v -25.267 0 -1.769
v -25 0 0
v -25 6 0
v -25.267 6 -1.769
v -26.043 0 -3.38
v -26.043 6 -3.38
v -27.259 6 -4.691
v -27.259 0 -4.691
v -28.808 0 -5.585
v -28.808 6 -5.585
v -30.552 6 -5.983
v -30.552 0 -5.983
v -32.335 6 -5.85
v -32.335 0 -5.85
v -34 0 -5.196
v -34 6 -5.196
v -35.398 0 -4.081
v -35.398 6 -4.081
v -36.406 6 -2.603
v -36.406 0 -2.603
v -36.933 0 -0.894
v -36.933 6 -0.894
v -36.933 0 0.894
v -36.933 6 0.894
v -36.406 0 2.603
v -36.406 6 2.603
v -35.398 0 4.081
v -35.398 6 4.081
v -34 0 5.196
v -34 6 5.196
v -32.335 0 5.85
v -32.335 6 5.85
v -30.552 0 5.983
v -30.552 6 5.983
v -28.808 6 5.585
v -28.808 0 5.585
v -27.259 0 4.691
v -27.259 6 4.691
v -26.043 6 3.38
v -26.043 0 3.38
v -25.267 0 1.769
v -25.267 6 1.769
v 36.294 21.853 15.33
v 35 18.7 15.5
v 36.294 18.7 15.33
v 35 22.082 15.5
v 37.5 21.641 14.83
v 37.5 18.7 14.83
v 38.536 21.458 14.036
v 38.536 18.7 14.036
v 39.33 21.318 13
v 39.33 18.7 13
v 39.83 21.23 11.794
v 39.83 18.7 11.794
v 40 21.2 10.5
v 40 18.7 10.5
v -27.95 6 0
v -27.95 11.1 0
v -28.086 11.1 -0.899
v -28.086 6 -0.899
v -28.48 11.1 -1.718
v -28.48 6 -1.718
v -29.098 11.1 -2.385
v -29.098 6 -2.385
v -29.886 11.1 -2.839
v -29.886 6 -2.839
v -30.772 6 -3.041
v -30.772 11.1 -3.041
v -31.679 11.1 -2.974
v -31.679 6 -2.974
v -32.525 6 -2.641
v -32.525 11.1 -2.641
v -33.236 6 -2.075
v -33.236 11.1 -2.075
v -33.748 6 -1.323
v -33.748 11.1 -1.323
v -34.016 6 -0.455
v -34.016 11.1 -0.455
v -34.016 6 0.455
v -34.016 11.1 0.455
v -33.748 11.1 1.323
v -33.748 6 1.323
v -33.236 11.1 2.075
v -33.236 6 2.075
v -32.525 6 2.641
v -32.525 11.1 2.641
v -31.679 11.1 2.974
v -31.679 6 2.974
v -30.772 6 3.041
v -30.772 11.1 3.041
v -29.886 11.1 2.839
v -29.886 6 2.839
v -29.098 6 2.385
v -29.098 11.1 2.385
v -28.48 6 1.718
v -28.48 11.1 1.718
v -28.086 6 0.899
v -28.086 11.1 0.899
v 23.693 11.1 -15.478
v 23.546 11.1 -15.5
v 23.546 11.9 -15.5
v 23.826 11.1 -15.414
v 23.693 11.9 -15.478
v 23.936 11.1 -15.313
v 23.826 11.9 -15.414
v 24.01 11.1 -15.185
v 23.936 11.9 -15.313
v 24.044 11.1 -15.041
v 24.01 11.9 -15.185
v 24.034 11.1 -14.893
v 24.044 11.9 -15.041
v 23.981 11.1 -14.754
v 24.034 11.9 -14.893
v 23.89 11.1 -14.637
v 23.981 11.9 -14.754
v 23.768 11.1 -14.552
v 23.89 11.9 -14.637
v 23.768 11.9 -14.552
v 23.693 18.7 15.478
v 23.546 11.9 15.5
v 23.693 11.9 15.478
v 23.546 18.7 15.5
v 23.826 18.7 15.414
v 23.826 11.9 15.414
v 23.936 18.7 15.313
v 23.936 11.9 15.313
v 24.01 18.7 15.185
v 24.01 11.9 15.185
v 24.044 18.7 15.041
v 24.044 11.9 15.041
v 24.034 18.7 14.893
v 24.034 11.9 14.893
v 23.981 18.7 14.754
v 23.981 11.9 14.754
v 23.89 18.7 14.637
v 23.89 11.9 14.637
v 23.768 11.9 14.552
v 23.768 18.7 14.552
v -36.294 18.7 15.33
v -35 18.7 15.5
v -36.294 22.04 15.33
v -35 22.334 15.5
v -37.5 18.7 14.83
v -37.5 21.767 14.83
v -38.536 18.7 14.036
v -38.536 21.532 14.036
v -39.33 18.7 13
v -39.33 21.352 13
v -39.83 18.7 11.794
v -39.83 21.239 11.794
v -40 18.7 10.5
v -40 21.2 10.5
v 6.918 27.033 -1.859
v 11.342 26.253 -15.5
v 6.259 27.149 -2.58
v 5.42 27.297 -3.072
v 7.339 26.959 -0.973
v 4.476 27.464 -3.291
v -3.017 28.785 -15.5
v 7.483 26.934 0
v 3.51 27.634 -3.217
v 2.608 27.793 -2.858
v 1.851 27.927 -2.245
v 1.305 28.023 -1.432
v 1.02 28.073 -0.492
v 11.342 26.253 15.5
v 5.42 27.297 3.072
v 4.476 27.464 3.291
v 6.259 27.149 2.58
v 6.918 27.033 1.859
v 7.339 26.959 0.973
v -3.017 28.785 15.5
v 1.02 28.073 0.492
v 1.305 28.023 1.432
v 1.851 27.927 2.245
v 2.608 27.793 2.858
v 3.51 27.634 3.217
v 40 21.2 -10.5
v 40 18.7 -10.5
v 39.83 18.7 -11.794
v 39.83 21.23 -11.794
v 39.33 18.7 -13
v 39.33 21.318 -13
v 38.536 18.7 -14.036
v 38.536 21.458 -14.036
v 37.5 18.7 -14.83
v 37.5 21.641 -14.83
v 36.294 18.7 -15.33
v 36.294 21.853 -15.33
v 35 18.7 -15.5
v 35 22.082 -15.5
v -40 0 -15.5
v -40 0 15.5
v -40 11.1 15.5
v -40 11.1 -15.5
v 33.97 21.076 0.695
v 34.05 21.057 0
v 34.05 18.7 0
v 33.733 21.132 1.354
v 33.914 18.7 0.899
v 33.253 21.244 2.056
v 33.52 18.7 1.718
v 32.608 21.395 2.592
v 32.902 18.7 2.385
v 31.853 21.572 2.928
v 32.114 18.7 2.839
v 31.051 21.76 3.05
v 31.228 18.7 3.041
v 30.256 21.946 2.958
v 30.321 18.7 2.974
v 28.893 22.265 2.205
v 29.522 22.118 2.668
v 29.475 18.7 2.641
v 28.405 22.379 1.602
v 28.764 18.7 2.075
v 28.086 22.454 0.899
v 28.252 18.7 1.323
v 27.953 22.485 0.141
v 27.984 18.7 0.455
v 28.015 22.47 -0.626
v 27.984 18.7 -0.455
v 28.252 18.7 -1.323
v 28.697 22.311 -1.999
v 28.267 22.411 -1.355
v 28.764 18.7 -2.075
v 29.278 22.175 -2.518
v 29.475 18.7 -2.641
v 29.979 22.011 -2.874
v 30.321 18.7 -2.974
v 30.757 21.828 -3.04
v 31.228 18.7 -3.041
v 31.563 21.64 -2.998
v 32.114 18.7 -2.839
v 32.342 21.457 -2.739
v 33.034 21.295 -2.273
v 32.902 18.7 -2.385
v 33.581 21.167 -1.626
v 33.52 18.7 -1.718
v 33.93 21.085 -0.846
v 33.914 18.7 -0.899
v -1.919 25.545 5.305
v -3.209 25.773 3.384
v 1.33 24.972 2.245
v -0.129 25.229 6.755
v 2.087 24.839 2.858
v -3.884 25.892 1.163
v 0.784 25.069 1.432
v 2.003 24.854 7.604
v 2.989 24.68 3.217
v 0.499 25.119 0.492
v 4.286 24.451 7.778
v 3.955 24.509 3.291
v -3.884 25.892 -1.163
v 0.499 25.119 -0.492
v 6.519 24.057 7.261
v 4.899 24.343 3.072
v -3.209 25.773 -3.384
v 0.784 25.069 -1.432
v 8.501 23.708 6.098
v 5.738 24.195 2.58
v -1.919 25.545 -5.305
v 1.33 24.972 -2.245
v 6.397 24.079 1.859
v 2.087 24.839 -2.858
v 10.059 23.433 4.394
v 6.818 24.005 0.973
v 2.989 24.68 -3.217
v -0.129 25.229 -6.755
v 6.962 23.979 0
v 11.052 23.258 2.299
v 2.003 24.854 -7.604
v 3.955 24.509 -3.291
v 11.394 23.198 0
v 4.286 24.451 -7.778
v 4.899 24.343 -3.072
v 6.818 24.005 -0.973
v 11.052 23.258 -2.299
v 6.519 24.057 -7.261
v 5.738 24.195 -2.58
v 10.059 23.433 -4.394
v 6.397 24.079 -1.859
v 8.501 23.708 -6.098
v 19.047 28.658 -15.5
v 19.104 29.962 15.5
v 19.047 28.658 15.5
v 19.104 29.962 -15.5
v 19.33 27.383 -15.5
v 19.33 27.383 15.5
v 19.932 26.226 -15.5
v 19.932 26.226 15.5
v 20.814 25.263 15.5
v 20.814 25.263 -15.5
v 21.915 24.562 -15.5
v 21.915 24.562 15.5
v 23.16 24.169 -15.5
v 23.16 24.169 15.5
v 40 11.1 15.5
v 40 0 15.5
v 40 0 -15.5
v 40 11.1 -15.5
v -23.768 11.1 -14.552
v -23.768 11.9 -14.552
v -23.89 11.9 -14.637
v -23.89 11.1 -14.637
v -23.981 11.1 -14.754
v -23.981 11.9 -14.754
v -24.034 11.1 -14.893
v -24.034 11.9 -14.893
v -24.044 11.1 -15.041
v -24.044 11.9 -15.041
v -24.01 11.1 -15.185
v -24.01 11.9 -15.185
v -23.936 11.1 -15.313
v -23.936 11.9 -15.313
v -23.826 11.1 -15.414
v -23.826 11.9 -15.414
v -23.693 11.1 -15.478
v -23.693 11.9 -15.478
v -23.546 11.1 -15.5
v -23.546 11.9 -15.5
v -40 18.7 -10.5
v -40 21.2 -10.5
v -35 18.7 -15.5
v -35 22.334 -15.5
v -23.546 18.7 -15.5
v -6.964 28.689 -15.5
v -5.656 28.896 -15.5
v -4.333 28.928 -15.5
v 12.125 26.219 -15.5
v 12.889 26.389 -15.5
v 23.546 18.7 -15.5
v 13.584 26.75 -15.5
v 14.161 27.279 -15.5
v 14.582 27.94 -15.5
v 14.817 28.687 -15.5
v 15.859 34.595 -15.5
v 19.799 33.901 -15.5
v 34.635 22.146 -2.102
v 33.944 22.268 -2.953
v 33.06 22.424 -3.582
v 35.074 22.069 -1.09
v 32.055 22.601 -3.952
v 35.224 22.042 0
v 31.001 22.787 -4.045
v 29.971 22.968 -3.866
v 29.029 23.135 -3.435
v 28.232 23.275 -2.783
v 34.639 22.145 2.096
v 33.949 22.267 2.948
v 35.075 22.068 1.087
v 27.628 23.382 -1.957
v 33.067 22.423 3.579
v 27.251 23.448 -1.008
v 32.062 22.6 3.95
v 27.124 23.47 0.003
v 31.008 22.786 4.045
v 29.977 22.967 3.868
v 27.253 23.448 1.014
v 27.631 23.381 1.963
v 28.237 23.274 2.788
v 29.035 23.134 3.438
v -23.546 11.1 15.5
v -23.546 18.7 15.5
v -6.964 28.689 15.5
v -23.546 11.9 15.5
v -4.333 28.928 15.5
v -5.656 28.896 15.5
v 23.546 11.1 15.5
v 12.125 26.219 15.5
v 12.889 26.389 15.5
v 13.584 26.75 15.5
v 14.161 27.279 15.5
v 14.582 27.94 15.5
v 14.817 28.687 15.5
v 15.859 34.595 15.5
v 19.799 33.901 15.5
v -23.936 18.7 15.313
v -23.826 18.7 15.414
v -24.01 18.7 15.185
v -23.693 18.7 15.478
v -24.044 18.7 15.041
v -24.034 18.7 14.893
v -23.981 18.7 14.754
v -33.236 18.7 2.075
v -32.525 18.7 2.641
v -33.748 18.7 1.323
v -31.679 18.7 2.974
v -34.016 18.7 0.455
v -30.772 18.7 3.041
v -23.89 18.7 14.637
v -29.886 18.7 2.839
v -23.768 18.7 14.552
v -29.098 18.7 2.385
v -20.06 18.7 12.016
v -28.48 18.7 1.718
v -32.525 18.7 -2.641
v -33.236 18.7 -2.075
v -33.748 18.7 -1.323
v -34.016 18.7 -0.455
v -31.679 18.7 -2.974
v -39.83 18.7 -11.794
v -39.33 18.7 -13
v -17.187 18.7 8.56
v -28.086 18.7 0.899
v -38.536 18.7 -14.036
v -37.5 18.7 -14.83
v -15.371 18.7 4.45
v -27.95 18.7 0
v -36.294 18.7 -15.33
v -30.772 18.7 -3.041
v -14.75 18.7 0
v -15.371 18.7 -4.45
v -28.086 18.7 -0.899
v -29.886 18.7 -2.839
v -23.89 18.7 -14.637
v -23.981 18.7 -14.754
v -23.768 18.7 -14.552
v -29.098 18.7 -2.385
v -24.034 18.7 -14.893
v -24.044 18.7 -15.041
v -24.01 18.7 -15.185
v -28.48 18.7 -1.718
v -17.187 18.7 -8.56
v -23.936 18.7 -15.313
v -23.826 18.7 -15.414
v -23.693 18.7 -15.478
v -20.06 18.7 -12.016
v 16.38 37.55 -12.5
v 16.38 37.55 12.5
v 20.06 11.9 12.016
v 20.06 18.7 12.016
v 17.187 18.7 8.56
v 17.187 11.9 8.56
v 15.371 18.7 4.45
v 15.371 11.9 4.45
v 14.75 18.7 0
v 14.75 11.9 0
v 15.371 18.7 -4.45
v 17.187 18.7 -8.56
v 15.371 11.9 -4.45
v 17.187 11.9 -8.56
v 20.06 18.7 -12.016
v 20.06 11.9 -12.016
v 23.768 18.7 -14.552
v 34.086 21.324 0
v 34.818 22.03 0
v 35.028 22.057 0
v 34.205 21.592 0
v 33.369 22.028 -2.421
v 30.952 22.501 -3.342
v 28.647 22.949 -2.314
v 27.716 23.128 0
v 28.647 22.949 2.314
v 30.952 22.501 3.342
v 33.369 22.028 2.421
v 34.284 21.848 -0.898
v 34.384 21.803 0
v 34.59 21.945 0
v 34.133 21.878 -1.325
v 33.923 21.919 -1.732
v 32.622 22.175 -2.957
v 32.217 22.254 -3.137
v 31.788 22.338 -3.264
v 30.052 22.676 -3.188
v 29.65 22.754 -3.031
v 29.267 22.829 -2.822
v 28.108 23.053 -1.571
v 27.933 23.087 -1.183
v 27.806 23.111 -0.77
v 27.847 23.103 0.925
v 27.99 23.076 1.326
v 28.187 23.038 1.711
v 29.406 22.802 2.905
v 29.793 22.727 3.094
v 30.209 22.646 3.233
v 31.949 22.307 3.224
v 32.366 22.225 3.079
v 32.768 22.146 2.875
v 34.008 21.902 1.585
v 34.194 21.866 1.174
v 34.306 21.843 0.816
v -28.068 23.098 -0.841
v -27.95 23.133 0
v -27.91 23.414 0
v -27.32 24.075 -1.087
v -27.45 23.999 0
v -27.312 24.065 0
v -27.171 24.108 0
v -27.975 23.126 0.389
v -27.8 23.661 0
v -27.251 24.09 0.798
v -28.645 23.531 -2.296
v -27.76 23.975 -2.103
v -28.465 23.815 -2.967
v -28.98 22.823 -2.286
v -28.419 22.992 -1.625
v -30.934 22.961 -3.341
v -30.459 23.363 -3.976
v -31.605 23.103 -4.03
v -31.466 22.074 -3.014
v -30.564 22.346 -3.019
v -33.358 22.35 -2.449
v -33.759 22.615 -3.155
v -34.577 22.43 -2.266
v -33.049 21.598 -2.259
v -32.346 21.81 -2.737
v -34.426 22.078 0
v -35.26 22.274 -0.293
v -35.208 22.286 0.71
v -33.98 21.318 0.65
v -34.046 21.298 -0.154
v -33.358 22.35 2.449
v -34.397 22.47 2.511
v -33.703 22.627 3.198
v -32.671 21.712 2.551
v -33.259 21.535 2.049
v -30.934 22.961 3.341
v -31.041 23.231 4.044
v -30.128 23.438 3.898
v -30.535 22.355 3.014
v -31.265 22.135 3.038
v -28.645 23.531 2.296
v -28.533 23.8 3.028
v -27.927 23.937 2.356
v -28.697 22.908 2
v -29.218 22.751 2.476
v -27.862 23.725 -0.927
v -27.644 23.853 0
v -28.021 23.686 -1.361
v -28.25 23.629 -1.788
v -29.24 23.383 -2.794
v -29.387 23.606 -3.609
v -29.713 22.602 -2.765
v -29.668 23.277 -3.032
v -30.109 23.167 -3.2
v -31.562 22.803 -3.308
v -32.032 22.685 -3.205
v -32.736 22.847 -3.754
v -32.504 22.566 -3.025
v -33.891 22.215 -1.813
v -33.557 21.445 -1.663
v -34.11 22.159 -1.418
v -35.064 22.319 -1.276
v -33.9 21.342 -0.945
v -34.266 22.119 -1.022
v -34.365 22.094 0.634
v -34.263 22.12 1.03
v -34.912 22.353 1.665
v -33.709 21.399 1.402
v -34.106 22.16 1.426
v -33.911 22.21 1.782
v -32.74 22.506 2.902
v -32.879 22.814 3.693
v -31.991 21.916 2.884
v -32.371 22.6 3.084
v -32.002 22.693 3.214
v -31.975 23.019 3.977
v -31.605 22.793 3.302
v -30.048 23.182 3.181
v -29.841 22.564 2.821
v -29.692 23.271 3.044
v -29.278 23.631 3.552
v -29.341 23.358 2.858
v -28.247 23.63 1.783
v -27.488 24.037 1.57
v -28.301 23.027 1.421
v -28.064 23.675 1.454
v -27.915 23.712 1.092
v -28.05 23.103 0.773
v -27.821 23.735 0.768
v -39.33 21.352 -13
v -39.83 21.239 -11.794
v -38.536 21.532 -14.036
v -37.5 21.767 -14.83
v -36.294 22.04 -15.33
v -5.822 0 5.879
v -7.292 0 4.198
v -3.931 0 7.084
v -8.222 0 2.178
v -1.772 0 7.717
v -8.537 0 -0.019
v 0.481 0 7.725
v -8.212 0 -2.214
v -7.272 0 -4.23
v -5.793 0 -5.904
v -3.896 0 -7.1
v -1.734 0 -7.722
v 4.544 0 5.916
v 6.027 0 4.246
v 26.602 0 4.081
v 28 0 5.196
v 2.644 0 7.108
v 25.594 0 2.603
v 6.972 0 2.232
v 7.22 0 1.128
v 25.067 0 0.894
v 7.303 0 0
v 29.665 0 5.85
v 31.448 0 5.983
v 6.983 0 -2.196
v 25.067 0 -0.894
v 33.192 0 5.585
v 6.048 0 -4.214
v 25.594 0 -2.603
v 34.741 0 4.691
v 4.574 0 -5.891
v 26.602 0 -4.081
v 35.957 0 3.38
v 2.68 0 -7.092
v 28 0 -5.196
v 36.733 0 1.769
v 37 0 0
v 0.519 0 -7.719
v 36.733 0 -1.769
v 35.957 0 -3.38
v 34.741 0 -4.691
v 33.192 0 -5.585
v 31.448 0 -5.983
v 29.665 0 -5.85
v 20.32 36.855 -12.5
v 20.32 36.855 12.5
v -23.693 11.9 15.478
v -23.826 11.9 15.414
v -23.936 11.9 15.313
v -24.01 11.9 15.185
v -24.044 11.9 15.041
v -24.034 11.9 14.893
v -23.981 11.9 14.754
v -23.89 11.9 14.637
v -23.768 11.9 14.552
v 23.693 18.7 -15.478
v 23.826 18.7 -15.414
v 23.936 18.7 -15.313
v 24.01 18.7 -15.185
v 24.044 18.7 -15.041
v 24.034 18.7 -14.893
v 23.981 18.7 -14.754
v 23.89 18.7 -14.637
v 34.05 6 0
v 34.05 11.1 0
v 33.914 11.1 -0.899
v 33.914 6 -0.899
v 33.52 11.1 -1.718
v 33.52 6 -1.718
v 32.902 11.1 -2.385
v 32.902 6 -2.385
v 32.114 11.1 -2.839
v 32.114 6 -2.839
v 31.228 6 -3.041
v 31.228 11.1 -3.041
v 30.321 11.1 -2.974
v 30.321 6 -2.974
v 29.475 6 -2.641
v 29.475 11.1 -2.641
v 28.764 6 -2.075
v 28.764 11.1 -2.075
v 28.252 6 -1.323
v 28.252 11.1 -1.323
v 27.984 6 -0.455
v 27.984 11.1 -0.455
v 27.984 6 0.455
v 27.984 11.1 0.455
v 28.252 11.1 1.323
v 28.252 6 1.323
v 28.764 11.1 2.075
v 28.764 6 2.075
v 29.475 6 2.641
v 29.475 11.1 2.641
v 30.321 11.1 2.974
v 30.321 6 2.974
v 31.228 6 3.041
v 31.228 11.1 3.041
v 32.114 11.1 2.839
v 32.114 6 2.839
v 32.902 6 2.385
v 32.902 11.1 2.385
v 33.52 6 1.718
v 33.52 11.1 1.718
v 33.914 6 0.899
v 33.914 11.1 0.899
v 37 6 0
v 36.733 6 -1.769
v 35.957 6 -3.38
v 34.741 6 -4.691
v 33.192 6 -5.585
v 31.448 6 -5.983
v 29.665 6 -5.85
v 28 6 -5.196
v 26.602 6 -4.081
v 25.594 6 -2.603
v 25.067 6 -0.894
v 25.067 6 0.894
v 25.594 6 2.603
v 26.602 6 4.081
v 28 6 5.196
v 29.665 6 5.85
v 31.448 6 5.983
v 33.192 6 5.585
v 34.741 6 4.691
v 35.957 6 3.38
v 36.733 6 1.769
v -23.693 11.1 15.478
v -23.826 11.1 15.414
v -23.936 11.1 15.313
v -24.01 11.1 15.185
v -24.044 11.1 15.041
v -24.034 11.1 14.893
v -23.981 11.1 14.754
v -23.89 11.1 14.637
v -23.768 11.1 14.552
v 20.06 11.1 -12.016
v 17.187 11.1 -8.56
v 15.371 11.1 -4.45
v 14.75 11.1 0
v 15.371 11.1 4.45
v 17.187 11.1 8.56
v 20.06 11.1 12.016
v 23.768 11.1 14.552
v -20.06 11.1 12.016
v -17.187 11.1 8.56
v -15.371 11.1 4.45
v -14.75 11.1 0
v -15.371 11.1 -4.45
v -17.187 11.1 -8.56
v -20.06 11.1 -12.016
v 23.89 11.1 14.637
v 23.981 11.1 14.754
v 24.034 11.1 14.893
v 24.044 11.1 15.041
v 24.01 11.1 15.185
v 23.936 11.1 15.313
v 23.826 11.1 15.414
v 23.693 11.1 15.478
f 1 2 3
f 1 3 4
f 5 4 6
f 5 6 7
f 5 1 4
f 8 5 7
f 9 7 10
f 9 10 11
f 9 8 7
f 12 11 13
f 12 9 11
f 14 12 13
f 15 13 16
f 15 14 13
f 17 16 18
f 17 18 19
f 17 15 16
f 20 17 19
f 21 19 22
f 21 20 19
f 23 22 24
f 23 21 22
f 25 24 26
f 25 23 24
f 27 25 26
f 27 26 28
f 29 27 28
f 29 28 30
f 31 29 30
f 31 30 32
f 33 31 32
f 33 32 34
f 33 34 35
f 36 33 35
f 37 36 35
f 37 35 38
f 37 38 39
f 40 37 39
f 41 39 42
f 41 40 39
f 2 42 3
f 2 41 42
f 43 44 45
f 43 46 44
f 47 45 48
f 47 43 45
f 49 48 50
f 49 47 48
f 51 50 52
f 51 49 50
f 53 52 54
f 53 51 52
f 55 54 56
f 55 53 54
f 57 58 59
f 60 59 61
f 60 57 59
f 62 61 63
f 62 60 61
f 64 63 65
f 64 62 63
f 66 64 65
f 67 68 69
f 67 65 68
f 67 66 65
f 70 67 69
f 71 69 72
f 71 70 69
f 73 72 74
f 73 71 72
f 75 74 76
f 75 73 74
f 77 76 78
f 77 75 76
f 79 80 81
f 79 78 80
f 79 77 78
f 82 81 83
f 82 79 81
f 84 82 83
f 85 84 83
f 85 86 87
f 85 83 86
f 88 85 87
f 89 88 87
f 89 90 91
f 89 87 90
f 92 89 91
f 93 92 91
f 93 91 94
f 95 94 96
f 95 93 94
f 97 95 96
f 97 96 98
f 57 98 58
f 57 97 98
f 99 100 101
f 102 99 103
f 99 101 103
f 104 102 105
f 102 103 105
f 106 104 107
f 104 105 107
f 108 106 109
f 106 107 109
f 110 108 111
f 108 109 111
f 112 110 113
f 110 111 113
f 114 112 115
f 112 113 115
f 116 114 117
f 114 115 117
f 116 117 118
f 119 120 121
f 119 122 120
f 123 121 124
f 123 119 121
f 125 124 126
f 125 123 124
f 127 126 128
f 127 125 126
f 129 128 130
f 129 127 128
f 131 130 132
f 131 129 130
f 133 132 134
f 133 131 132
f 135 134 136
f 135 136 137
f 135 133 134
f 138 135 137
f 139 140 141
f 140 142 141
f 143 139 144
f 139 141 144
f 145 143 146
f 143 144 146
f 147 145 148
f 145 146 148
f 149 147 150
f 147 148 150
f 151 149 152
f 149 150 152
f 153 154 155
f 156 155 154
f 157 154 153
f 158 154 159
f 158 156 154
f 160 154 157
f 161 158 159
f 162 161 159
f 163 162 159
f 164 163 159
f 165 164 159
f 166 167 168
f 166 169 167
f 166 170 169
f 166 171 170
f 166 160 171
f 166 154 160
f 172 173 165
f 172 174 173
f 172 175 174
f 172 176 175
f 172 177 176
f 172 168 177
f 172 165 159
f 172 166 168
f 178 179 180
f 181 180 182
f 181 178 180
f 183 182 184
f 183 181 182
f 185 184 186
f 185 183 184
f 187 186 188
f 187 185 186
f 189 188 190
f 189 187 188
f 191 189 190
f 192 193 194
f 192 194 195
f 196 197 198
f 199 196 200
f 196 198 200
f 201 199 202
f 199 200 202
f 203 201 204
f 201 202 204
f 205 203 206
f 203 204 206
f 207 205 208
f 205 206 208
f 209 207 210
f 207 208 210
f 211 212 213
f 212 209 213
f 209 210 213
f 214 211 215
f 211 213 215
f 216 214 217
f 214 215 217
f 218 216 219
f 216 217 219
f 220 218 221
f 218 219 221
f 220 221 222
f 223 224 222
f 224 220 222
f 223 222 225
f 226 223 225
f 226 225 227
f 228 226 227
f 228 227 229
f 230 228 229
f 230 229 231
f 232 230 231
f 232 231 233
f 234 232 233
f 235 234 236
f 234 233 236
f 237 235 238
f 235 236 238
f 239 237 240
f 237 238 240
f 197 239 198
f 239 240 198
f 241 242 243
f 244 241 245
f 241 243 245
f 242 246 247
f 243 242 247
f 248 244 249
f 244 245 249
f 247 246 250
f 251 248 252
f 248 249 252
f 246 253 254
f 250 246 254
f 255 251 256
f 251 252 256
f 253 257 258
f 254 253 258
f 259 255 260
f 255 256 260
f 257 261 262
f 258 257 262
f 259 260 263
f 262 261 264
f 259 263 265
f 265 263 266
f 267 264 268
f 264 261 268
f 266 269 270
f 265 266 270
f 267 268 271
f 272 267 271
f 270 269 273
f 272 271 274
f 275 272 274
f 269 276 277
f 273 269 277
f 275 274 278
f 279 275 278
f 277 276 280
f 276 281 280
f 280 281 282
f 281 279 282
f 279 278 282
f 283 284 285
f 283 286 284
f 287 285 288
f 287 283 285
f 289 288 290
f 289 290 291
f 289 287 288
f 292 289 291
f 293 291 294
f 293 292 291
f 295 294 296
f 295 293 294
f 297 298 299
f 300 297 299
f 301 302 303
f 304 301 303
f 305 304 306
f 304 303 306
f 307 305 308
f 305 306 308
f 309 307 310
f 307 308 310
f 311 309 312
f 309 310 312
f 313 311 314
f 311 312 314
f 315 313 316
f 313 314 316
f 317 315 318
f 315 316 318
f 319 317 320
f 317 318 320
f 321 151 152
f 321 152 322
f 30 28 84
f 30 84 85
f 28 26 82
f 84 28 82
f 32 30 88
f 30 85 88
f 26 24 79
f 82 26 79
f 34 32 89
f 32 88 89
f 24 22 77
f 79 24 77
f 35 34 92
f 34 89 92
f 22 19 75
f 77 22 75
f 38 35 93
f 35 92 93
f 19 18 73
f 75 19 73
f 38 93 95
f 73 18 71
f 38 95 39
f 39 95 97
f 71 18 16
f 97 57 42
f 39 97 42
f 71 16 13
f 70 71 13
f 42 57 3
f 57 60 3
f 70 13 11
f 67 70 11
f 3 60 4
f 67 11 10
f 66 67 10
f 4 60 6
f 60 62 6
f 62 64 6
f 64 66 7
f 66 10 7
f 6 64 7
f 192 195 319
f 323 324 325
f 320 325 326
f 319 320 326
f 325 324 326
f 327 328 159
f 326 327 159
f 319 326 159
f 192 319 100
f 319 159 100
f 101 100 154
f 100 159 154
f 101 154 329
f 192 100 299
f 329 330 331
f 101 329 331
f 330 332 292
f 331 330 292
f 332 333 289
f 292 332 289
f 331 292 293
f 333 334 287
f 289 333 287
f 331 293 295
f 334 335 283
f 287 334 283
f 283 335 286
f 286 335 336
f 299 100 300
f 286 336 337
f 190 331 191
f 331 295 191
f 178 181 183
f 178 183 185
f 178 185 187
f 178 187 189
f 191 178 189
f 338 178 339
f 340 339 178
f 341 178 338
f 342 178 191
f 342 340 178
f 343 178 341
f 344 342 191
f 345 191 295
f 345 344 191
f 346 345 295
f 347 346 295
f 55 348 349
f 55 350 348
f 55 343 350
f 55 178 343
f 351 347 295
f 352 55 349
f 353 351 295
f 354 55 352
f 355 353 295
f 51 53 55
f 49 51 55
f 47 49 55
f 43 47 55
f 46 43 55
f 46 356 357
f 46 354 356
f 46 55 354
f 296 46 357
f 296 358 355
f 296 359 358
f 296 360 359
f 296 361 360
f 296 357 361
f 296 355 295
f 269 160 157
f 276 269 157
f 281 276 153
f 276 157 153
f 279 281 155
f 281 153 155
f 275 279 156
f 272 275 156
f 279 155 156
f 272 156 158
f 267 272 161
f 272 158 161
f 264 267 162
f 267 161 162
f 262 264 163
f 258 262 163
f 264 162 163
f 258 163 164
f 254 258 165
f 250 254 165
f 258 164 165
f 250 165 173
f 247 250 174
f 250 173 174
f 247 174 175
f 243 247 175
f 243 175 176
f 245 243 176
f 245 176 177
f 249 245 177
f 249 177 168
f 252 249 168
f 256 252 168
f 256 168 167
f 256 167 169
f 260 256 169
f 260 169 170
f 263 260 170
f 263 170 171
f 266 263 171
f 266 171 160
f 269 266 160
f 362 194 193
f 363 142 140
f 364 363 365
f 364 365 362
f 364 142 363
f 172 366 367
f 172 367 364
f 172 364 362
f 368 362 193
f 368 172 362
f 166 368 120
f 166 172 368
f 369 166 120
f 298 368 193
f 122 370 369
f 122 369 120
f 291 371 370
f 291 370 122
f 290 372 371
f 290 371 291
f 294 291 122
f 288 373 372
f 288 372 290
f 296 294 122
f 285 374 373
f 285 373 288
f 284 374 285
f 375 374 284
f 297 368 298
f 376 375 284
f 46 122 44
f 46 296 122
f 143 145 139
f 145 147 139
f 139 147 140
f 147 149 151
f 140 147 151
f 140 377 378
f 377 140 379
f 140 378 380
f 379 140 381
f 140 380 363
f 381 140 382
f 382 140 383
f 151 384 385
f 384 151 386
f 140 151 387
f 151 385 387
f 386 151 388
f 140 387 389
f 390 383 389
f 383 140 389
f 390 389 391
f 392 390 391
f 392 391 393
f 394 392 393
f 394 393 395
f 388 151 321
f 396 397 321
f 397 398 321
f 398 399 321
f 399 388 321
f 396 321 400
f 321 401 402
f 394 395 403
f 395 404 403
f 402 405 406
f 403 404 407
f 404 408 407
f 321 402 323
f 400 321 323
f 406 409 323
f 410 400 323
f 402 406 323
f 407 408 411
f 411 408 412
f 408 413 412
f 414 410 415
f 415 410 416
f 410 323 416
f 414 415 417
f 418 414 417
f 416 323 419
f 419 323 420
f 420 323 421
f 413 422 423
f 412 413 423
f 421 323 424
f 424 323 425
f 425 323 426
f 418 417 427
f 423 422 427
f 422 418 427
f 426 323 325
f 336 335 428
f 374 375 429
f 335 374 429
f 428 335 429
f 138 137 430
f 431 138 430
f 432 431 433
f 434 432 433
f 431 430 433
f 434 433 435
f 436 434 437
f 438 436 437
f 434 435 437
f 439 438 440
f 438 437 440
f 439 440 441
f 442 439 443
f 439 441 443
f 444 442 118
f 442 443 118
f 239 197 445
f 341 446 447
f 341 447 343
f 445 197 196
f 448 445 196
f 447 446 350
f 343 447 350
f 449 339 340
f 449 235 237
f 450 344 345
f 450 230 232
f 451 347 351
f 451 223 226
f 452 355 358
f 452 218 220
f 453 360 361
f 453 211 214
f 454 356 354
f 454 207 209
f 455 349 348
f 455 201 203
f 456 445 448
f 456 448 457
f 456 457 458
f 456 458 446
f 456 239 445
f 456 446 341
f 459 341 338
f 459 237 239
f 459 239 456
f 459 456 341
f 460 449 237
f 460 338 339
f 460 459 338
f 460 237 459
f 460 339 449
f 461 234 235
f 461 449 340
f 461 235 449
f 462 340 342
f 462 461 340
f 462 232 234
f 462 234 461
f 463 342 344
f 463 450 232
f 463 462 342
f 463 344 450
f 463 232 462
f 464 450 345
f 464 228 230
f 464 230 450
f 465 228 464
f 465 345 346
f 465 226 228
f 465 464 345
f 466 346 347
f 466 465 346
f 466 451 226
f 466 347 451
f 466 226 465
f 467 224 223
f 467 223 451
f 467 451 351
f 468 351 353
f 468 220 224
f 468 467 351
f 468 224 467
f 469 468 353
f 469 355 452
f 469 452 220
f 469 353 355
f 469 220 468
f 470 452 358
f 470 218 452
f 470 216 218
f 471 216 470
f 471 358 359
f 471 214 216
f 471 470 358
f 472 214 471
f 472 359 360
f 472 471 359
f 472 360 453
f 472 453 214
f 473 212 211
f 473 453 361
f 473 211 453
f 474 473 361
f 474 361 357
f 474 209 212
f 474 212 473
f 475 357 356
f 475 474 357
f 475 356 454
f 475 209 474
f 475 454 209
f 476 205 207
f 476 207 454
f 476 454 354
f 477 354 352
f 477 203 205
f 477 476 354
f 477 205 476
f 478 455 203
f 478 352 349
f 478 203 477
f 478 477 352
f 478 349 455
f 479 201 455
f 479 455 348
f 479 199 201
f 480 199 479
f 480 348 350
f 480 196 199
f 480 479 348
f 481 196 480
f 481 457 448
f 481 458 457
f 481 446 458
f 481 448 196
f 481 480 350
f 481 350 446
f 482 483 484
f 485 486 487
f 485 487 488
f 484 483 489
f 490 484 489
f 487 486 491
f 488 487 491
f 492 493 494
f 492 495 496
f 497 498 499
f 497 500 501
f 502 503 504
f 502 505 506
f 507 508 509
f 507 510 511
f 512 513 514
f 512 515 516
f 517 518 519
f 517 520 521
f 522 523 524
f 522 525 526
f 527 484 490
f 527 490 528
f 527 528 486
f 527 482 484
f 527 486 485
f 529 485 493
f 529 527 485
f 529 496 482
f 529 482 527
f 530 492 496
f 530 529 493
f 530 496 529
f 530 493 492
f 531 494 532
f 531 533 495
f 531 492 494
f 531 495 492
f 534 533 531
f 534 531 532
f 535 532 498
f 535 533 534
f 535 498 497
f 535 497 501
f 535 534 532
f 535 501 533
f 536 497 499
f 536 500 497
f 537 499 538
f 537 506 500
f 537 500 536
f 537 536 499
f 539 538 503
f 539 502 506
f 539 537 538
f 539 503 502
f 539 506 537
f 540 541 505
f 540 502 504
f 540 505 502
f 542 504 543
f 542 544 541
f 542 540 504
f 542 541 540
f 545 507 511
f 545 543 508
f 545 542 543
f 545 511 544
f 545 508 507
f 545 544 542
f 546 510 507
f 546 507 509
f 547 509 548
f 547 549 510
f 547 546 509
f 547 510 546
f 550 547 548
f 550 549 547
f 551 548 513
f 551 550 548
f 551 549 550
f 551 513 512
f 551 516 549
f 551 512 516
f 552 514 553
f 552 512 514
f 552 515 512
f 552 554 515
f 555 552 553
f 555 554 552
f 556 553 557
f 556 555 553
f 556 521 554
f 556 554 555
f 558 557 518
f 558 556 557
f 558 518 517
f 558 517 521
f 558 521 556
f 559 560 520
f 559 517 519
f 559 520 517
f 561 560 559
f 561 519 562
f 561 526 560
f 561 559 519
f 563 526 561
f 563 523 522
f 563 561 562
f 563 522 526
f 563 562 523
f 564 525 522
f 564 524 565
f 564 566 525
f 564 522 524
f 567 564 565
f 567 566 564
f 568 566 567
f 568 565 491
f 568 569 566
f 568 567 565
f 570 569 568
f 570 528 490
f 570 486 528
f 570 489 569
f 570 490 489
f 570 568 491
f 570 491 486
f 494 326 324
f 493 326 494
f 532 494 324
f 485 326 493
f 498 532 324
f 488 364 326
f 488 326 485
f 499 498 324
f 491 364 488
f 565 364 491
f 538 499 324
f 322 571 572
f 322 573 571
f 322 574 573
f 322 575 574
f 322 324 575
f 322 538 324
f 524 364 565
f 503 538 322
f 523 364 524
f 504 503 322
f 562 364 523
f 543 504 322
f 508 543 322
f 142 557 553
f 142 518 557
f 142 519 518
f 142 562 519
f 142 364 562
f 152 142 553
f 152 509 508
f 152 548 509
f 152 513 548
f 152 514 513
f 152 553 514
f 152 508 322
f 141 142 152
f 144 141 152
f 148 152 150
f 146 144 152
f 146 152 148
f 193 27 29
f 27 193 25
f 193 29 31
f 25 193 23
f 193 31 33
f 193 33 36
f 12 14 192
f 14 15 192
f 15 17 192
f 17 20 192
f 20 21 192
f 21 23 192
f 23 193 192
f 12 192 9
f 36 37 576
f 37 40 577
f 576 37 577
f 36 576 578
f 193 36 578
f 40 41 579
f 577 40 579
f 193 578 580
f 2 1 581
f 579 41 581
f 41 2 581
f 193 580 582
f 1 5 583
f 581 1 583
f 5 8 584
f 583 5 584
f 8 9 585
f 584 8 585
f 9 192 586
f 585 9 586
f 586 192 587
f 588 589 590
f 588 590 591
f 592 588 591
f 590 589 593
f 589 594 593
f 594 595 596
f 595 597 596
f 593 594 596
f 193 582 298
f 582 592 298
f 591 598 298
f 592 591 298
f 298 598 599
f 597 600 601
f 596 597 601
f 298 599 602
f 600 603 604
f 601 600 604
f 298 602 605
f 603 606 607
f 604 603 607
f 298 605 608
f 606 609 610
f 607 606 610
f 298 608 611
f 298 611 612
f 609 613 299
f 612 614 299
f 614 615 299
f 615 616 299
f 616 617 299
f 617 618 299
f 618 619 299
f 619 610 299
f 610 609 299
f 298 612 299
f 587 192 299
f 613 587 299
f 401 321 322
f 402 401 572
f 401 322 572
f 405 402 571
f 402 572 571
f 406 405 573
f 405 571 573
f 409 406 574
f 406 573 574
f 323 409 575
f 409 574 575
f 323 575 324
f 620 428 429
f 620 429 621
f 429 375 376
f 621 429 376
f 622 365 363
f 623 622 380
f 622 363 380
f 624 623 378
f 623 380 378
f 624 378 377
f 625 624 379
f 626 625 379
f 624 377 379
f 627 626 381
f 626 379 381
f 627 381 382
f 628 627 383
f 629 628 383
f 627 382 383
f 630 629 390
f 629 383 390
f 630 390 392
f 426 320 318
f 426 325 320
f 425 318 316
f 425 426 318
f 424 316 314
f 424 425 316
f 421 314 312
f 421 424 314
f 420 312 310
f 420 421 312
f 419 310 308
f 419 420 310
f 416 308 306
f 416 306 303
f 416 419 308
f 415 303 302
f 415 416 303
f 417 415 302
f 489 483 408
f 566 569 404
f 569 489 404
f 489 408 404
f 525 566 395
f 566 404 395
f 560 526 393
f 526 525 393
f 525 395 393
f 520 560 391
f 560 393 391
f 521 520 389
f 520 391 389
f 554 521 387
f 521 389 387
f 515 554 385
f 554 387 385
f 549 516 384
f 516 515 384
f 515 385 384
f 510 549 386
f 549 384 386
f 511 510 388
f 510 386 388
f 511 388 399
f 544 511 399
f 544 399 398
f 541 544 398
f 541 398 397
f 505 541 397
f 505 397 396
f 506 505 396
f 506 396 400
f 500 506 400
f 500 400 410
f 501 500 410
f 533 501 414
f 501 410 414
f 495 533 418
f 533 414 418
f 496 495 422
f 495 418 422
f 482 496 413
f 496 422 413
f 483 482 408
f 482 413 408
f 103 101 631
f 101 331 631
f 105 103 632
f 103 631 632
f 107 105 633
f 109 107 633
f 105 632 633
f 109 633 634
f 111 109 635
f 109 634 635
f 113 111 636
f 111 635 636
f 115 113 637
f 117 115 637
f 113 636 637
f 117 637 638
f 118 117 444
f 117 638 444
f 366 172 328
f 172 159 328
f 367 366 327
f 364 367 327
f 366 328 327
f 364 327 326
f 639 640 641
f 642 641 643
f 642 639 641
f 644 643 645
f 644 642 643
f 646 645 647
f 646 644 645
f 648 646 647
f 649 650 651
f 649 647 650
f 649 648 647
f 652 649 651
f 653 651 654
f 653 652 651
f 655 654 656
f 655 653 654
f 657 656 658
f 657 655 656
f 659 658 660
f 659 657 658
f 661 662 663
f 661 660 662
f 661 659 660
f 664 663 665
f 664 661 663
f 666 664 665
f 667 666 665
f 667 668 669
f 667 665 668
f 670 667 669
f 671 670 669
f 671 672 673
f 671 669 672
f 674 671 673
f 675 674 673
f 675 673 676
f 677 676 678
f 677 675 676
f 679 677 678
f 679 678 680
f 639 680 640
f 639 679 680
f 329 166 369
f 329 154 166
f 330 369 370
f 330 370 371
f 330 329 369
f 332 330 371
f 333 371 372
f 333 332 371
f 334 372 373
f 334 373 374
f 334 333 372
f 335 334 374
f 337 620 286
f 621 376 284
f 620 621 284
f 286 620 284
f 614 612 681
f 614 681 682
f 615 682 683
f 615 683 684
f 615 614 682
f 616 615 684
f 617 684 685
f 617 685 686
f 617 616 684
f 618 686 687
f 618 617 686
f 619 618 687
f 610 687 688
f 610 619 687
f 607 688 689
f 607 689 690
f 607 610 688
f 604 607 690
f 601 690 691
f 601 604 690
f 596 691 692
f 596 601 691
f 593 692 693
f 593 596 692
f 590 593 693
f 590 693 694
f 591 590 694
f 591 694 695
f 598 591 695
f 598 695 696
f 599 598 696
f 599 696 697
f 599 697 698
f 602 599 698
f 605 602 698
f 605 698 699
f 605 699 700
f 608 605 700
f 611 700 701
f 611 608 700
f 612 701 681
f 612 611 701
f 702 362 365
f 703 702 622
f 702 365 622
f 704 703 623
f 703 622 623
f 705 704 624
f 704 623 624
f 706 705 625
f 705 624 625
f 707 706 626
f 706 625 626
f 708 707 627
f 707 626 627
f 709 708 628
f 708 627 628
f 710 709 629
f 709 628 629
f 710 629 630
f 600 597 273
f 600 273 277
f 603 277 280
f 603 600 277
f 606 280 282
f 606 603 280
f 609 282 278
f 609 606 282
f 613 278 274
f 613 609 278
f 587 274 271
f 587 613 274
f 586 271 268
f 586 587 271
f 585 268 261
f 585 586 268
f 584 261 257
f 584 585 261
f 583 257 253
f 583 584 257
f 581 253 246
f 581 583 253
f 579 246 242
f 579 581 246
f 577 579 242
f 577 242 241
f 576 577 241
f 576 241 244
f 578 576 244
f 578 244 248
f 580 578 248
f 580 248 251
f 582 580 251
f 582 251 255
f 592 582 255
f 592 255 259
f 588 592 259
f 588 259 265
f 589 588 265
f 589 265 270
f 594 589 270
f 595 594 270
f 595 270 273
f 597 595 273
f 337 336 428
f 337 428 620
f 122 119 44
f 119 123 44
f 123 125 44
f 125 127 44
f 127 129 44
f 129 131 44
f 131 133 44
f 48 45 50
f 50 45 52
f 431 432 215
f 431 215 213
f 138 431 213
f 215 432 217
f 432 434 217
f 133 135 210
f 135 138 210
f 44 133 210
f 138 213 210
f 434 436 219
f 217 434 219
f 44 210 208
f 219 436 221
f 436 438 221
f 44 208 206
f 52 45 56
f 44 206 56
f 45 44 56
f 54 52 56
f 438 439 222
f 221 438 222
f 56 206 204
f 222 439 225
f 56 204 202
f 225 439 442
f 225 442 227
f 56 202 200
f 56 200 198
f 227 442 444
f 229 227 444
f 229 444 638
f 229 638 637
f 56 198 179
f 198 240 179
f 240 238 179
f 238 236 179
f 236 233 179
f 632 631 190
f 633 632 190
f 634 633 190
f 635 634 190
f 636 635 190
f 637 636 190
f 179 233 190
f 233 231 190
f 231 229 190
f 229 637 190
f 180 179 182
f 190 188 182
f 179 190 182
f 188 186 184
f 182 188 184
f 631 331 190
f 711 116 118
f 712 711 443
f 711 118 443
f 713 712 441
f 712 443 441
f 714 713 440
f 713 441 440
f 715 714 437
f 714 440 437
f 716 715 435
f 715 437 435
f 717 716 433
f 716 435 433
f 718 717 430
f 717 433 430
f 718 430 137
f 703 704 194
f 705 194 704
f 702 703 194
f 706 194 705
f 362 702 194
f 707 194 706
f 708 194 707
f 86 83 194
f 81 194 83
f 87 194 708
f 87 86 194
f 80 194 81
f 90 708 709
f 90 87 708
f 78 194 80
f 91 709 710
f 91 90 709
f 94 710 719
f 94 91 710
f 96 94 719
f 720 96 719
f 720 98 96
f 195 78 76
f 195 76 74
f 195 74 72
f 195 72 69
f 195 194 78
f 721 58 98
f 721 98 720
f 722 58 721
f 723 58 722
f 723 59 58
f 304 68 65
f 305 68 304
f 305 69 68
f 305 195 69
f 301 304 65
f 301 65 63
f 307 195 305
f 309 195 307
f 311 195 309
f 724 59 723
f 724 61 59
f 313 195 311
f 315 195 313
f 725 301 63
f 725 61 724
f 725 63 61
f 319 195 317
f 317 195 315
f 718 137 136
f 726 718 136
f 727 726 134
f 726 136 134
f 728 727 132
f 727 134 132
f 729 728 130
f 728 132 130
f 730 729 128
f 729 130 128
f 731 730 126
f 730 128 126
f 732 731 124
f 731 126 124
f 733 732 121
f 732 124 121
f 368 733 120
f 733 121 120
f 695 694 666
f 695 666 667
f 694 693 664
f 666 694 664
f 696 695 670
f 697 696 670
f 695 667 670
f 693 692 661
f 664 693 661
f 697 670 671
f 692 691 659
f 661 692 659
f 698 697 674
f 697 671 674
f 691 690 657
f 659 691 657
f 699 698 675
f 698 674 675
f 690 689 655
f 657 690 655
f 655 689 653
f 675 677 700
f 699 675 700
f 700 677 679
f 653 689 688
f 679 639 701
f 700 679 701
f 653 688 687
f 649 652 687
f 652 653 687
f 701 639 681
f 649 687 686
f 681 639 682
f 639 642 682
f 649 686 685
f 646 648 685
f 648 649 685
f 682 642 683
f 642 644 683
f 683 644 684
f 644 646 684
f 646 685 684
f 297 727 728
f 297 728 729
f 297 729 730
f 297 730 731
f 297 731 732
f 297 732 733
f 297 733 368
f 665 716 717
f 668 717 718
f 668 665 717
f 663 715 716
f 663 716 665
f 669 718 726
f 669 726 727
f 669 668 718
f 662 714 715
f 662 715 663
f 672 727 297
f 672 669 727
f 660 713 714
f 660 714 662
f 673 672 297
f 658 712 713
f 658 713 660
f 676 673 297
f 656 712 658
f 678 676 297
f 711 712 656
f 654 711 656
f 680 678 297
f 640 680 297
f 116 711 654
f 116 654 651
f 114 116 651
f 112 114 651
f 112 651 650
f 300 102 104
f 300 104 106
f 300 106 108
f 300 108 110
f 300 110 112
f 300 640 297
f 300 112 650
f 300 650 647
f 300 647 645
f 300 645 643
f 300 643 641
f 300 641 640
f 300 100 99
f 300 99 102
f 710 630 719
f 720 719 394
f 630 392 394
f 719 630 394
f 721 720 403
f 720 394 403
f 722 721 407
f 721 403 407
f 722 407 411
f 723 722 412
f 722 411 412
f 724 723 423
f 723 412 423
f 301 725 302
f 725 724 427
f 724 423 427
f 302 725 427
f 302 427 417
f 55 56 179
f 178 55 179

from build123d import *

# Parameters (mm, degrees)
SKETCH1_W           = 80
SKETCH1_H           = 31
SKETCH1_R           = 6
BOSS_EXTRUDE1_DEPTH = 6
SKETCH2_W           = 80
SKETCH2_H           = 31
SKETCH2_R           = 3.05
BOSS_EXTRUDE2_DEPTH = 5.9
BOSS_EXTRUDE3_DEPTH = 6.8
FILLET1_R           = 0.5
SKETCH4_W           = 80
SKETCH4_H           = 31
SKETCH4_R           = 3.05
BOSS_EXTRUDE4_DEPTH = 2.5
BOSS_EXTRUDE5_DEPTH = 31
SKETCH6_R           = 3.3
CUT_EXTRUDE1_DEPTH  = 48
SKETCH7_R           = 7.8
CUT_EXTRUDE2_DEPTH  = 47
BOSS_EXTRUDE6_DEPTH = 31
FILLET2_R           = 3
FILLET3_R           = 5
CHAMFER1_SIZE       = 3
FILLET4_R           = 5
FILLET5_R           = 10
SKETCH9_R           = 3.05
CUT_EXTRUDE3_DEPTH  = 32.549910473
FILLET6_R           = 1
CUT_EXTRUDE4_DEPTH  = 0.8


with BuildPart() as part:
    # Sketch1 → Boss-Extrude1 (new body)
    with BuildSketch(Plane(origin=(0, 0, 0), x_dir=(1, 0, 0), z_dir=(0, 1, 0))):
        Rectangle(SKETCH1_W, SKETCH1_H)
        with Locations((-31, 0)):
            Circle(SKETCH1_R, mode=Mode.SUBTRACT)
        with Locations((31, 0)):
            Circle(SKETCH1_R, mode=Mode.SUBTRACT)
    extrude(amount=BOSS_EXTRUDE1_DEPTH)

    # Sketch2 → Boss-Extrude2 (add)
    with BuildSketch(Plane(origin=(0, 6, 0), x_dir=(1, 0, 0), z_dir=(0, 1, 0))):
        Rectangle(SKETCH2_W, SKETCH2_H)
        with Locations((-31, 0)):
            Circle(SKETCH2_R, mode=Mode.SUBTRACT)
        with Locations((31, 0)):
            Circle(SKETCH2_R, mode=Mode.SUBTRACT)
    extrude(amount=BOSS_EXTRUDE2_DEPTH)

    # Sketch3 → Boss-Extrude3 (add)
    with BuildSketch(Plane(origin=(0, 11.9, 0), x_dir=(1, 0, 0), z_dir=(0, 1, 0))):
        with BuildLine():
            ThreePointArc((26.120194676, -15.5), (14.75, 0), (26.120194676, 15.5))
            Line((26.120194676, 15.5), (-26.120194676, 15.5))
            ThreePointArc((-26.120194676, 15.5), (-17.897341176, 9.611598813), (-14.75, 0))
            ThreePointArc((-14.75, 0), (-17.897341176, -9.611598813), (-26.120194676, -15.5))
            Line((-26.120194676, -15.5), (26.120194676, -15.5))
        make_face()
    extrude(amount=BOSS_EXTRUDE3_DEPTH)

    # Fillet1
    fillet1_edges = [part.edges().sort_by_distance(p)[0] for p in [
        (26.120194676, 15.3, 15.5),
        (26.120194676, 15.3, -15.5),
        (-26.120194676, 15.3, -15.5),
        (-26.120194676, 15.3, 15.5),
    ]]
    fillet(fillet1_edges, radius=FILLET1_R)

    # Sketch4 → Boss-Extrude4 (add)
    with BuildSketch(Plane(origin=(0, 18.7, 0), x_dir=(1, 0, 0), z_dir=(0, 1, 0))):
        Rectangle(SKETCH4_W, SKETCH4_H)
        with Locations((-31, 0)):
            Circle(SKETCH4_R, mode=Mode.SUBTRACT)
        with Locations((31, 0)):
            Circle(SKETCH4_R, mode=Mode.SUBTRACT)
    extrude(amount=BOSS_EXTRUDE4_DEPTH)

    # Sketch5 → Boss-Extrude5 (add)
    with BuildSketch(Plane.XY.offset(15.5)):
        Polygon((40, 21.2), (-5, 29.134714132), (-40, 21.2), align=None)
    extrude(amount=-BOSS_EXTRUDE5_DEPTH)

    # Sketch6 → Cut-Extrude1 (cut)
    with BuildSketch(Plane(origin=(4.831561104, 27.401144647, 0), x_dir=(0.984807753, -0.173648178, 0), z_dir=(0.173648178, 0.984807753, 0))):
        with Locations((-0.60768988, 0)):
            Circle(SKETCH6_R)
    extrude(amount=-CUT_EXTRUDE1_DEPTH, mode=Mode.SUBTRACT)

    # Sketch7 → Cut-Extrude2 (cut)
    with BuildSketch(Plane(origin=(-3.85084778, -21.839243004, 0), x_dir=(0.984807753, -0.173648178, 0), z_dir=(0.173648178, 0.984807753, 0))):
        with Locations((-0.60768988, 0)):
            Circle(SKETCH7_R)
    extrude(amount=CUT_EXTRUDE2_DEPTH, mode=Mode.SUBTRACT)

    # Sketch8 → Boss-Extrude6 (add)
    with BuildSketch(Plane.XY.offset(15.5)):
        Polygon((14.296517646, 25.732217437), (16.380295778, 37.549910473), (20.31952679, 36.855317763), (18.235748658, 25.037624726), align=None)
    extrude(amount=-BOSS_EXTRUDE6_DEPTH)

    # Fillet2
    fillet2_edges = [part.edges().sort_by_distance(p)[0] for p in [
        (14.296517646, 25.732217437, 0),
    ]]
    fillet(fillet2_edges, radius=FILLET2_R)

    # Fillet3
    fillet3_edges = [part.edges().sort_by_distance(p)[0] for p in [
        (18.235748658, 25.037624726, 0),
    ]]
    fillet(fillet3_edges, radius=FILLET3_R)

    # Chamfer1
    chamfer1_edges = [part.edges().sort_by_distance(p)[0] for p in [
        (18.349911284, 37.202614118, 15.5),
        (18.349911284, 37.202614118, -15.5),
    ]]
    chamfer(chamfer1_edges, length=CHAMFER1_SIZE)

    # Fillet4
    fillet4_edges = [part.edges().sort_by_distance(p)[0] for p in [
        (-40, 19.95, -15.5),
        (-40, 19.95, 15.5),
        (40, 19.95, 15.5),
        (40, 19.95, -15.5),
    ]]
    fillet(fillet4_edges, radius=FILLET4_R)

    # Fillet5
    fillet5_edges = [part.edges().sort_by_distance(p)[0] for p in [
        (-5, 29.134714132, 0),
    ]]
    fillet(fillet5_edges, radius=FILLET5_R)

    # Sketch9 → Cut-Extrude3 (cut, through all)
    with BuildSketch(Plane.XZ.offset(-6)):
        with Locations((-31, 0)):
            Circle(SKETCH9_R)
        with Locations((31, 0)):
            Circle(SKETCH9_R)
    extrude(amount=-CUT_EXTRUDE3_DEPTH, mode=Mode.SUBTRACT)

    # Fillet6
    fillet6_edges = [part.edges().sort_by_distance(p)[0] for p in [
        (27.95, 23.324740118, 2.44e-07),
        (-34.05, 22.548901402, 8.61e-07),
    ]]
    fillet(fillet6_edges, radius=FILLET6_R)

    # Sketch10 → Cut-Extrude4 (cut)
    with BuildSketch(Plane(origin=(0, 11.9, 0), x_dir=(1, 0, 0), z_dir=(0, 1, 0))):
        with BuildLine():
            Line((40, 15.5), (23.545974242, 15.5))
            ThreePointArc((23.545974242, 15.5), (24.032739379, 15.114279051), (23.768482474, 14.552238806))
            ThreePointArc((23.768482474, 14.552238806), (14.75, 0), (23.768482474, -14.552238806))
            ThreePointArc((23.768482474, -14.552238806), (24.032739379, -15.114279051), (23.545974242, -15.5))
            Line((23.545974242, -15.5), (40, -15.5))
            Line((40, -15.5), (40, 15.5))
        make_face()
        with BuildLine():
            Line((-40, -15.5), (-23.545974242, -15.5))
            ThreePointArc((-23.545974242, -15.5), (-24.032739379, -15.114279051), (-23.768482474, -14.552238806))
            ThreePointArc((-23.768482474, -14.552238806), (-14.75, 0), (-23.768482474, 14.552238806))
            ThreePointArc((-23.768482474, 14.552238806), (-24.032739379, 15.114279051), (-23.545974242, 15.5))
            Line((-23.545974242, 15.5), (-40, 15.5))
            Line((-40, 15.5), (-40, -15.5))
        make_face()
    extrude(amount=-CUT_EXTRUDE4_DEPTH, mode=Mode.SUBTRACT)


solid = part.part
